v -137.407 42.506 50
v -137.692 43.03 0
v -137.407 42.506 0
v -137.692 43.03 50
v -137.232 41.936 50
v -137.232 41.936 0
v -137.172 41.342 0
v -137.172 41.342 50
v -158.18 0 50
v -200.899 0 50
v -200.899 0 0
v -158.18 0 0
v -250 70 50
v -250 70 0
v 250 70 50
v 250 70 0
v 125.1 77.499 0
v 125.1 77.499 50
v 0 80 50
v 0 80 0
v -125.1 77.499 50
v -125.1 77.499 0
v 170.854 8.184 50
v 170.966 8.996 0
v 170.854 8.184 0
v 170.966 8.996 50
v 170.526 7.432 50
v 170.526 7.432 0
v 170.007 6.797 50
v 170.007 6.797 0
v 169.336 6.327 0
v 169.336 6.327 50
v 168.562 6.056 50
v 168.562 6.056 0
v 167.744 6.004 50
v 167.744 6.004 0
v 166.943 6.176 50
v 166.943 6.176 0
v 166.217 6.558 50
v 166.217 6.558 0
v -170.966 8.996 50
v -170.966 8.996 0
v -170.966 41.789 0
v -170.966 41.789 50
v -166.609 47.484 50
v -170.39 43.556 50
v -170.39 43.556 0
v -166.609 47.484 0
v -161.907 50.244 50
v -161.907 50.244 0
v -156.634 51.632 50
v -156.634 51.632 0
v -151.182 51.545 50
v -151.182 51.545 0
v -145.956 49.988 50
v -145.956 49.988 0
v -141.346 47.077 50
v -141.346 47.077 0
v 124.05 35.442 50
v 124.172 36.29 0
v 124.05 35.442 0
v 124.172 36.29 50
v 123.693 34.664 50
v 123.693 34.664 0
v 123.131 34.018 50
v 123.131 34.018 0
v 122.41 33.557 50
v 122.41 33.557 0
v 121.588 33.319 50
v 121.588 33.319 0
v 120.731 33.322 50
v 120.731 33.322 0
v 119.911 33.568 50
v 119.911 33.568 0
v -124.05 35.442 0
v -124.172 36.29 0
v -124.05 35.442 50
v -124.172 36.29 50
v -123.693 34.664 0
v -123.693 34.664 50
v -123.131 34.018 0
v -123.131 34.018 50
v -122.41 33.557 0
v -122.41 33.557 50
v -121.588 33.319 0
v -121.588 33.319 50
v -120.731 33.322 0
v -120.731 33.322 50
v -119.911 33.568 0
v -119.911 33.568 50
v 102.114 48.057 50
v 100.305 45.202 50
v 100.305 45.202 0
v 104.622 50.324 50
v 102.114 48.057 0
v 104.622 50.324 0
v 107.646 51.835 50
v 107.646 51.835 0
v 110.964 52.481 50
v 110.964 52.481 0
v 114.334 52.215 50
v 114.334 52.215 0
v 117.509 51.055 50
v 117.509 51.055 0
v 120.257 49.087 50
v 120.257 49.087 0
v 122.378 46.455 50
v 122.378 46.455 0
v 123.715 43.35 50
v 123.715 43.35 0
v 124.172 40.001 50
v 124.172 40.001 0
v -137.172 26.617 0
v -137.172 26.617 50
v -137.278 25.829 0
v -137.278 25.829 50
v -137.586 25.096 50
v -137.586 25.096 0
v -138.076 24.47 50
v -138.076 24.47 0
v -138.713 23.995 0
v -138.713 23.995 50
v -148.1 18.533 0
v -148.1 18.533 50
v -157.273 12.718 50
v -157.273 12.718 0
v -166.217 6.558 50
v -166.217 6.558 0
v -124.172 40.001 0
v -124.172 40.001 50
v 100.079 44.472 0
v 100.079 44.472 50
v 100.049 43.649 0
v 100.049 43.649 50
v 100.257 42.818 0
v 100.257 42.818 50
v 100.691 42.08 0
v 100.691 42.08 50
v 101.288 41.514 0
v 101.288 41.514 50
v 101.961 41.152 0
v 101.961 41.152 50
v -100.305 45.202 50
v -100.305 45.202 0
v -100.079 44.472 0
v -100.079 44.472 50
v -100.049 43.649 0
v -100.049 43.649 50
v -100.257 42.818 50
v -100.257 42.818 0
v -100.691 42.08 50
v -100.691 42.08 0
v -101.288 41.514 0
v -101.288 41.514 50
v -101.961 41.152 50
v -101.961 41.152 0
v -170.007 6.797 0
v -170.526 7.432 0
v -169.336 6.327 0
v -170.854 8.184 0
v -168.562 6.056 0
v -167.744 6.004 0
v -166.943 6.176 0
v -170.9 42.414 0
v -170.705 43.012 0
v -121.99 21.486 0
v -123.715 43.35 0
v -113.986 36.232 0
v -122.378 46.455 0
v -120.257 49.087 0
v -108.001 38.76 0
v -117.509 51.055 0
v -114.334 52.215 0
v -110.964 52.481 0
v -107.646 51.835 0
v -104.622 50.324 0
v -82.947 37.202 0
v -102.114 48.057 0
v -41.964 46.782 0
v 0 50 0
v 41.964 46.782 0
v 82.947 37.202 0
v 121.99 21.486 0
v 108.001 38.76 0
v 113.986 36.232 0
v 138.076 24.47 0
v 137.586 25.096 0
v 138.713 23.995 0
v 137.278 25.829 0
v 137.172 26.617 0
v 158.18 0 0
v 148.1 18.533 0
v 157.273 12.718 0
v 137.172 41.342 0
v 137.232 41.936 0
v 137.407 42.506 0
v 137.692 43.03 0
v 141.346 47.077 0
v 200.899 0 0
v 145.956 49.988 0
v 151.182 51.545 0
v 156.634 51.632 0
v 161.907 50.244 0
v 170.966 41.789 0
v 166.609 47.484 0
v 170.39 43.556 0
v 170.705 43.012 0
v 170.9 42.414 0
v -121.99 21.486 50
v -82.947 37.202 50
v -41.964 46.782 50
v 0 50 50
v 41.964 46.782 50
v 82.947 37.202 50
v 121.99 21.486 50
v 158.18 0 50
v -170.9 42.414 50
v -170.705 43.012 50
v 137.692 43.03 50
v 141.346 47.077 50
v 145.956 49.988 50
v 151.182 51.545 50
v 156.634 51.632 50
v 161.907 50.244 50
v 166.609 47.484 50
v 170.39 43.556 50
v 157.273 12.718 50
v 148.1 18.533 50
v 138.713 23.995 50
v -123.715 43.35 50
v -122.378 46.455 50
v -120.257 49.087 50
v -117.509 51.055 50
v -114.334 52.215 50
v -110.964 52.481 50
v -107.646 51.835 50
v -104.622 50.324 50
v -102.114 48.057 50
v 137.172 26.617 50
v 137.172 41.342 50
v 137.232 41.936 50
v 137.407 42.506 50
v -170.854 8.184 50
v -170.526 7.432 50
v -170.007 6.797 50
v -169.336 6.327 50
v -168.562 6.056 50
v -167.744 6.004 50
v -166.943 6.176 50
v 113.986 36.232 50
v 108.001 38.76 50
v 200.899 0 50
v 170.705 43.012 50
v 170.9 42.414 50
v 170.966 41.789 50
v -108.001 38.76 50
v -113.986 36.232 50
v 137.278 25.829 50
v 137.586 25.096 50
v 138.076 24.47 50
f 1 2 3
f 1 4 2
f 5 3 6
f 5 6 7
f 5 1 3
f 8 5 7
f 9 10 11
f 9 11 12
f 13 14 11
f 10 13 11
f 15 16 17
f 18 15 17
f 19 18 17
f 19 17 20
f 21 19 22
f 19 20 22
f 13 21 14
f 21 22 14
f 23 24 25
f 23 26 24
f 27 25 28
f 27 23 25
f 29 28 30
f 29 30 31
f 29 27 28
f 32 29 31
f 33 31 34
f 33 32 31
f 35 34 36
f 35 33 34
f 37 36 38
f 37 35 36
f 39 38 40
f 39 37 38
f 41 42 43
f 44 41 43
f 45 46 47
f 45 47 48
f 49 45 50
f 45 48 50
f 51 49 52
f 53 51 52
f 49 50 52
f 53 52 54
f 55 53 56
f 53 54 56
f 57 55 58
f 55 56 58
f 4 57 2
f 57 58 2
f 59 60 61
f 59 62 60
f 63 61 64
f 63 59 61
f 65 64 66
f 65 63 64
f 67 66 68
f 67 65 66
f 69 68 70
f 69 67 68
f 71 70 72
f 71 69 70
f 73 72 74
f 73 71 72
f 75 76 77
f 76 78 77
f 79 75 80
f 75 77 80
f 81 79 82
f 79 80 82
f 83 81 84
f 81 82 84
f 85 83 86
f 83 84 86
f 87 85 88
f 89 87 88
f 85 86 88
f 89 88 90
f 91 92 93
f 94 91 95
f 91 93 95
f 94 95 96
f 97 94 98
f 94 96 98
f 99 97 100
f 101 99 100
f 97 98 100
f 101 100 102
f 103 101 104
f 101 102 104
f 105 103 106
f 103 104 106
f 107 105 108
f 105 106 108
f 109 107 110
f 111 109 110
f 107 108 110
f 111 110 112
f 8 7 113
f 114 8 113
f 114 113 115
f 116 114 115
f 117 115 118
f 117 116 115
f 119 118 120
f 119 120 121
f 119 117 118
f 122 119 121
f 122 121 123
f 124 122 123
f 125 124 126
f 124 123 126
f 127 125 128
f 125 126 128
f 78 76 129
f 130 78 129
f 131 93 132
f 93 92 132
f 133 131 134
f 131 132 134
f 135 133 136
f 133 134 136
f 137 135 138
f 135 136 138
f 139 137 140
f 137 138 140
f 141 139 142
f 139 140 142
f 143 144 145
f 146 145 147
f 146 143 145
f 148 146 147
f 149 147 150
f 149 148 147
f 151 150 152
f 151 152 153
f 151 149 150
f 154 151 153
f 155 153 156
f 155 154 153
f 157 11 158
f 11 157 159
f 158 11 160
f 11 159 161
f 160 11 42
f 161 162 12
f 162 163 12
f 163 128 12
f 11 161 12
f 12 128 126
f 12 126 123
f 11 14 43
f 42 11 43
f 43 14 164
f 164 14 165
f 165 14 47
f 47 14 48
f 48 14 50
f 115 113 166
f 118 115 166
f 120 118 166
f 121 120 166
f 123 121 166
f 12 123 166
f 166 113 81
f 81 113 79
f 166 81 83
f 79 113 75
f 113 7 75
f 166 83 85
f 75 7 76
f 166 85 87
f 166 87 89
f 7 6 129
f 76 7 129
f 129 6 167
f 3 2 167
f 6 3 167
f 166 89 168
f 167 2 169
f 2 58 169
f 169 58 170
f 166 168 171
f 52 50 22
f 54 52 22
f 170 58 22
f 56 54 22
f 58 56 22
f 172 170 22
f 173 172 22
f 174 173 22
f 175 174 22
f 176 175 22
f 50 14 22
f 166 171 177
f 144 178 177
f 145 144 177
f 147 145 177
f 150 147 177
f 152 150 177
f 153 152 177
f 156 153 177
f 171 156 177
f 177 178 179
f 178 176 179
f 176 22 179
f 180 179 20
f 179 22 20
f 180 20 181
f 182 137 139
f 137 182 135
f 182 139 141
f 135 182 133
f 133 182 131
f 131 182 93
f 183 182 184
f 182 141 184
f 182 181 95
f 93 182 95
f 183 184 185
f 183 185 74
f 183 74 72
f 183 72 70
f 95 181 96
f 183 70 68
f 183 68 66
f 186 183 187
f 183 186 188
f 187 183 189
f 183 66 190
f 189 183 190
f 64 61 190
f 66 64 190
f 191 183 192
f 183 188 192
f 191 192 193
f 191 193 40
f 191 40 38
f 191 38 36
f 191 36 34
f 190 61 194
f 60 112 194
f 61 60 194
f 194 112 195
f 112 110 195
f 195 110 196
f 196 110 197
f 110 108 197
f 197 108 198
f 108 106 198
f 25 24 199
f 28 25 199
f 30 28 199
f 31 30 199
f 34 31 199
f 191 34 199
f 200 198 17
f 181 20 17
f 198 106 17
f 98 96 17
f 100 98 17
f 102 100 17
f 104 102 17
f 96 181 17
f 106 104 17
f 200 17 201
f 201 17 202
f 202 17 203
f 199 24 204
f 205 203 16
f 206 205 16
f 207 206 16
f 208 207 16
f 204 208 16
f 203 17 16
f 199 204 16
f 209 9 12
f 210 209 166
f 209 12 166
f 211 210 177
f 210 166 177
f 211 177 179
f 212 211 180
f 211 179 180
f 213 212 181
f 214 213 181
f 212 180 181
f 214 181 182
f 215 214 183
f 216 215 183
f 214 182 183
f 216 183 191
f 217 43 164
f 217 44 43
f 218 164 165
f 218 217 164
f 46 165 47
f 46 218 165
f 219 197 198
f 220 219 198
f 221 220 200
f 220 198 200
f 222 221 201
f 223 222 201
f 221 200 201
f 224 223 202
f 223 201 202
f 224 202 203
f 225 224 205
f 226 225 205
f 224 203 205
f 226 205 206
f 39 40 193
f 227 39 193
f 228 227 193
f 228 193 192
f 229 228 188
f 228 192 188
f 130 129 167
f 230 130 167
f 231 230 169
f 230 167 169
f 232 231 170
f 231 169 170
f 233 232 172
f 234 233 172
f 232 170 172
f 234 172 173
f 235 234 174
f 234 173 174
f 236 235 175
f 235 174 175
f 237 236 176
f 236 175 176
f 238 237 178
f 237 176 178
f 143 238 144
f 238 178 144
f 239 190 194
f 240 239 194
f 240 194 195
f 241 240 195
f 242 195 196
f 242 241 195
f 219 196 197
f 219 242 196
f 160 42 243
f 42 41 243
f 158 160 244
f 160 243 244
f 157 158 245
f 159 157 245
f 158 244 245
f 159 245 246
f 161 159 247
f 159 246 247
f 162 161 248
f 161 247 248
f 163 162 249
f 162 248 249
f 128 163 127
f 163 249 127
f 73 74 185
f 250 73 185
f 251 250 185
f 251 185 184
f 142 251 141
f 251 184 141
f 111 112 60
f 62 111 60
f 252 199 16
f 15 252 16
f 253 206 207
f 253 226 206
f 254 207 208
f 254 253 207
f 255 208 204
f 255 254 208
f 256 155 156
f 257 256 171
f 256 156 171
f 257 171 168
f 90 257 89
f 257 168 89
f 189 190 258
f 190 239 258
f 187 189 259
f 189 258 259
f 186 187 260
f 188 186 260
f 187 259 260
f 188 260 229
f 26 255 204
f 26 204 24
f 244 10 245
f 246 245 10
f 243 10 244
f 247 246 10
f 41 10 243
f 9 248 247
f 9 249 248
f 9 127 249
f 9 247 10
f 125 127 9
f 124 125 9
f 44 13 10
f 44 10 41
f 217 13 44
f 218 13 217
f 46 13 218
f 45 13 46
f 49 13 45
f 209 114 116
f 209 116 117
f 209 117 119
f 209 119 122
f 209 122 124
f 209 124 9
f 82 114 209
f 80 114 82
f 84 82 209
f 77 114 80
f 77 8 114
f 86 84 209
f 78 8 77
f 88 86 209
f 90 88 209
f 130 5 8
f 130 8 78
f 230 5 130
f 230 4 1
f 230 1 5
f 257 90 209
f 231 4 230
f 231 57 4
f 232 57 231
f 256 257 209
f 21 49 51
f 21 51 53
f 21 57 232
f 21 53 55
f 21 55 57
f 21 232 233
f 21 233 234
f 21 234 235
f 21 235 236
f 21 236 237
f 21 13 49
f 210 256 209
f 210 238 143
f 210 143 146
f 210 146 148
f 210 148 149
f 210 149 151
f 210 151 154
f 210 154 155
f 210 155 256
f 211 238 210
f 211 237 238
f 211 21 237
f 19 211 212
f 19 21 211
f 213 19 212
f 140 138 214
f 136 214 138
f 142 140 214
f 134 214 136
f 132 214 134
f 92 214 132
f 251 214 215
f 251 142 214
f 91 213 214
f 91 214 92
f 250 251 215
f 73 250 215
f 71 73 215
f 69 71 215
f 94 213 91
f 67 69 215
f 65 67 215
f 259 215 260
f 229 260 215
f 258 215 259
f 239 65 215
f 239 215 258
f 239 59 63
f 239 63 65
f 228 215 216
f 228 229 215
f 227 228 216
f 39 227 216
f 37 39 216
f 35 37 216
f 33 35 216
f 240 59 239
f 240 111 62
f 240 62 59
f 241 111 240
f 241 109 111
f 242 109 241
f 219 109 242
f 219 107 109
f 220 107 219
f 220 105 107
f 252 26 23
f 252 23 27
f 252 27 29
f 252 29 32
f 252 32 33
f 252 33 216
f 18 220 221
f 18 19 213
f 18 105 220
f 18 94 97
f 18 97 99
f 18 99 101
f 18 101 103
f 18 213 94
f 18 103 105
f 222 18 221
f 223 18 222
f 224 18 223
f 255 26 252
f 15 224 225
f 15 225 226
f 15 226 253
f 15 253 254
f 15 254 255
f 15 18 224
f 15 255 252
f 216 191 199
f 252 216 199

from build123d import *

# Parameters (mm, degrees)
EXTRUDE_1_DEPTH = 50
FILLET_1_R      = 3


with BuildPart() as part:
    # 草图2 → 凸台-拉伸1 (new body)
    with BuildSketch(Plane.XY):
        with BuildLine():
            Line((-200.898692044, 0), (-175, 0))
            ThreePointArc((-175, 0), (-172.9897341, 1.547802854), (-170.96577925, 3.077662138))
            Line((-170.96577925, 3.077662138), (-170.96577925, 42.722835601))
            ThreePointArc((-170.96577925, 42.722835601), (-153.932084993, 51.775484786), (-137.172282431, 42.225290265))
            Line((-137.172282431, 42.225290265), (-137.172282431, 24.846777263))
            ThreePointArc((-137.172282431, 24.846777263), (-130.71526297, 28.281929654), (-124.172282431, 31.55038157))
            Line((-124.172282431, 31.55038157), (-124.172282431, 40.001262339))
            ThreePointArc((-124.172282431, 40.001262339), (-112.742884956, 52.455330358), (-99.355672794, 42.134599408))
            ThreePointArc((-99.355672794, 42.134599408), (0, 60), (99.355672794, 42.134599408))
            ThreePointArc((99.355672794, 42.134599408), (112.742884956, 52.455330358), (124.172282431, 40.001262339))
            Line((124.172282431, 40.001262339), (124.172282431, 31.55038157))
            ThreePointArc((124.172282431, 31.55038157), (130.71526297, 28.281929654), (137.172282431, 24.846777263))
            Line((137.172282431, 24.846777263), (137.172282431, 42.225290265))
            ThreePointArc((137.172282431, 42.225290265), (153.932084993, 51.775484786), (170.96577925, 42.722835601))
            Line((170.96577925, 42.722835601), (170.96577925, 3.077662138))
            ThreePointArc((170.96577925, 3.077662138), (172.9897341, 1.547802854), (175, 0))
            Line((175, 0), (200.898692044, 0))
            Line((200.898692044, 0), (250, 70))
            ThreePointArc((250, 70), (0, 80), (-250, 70))
            Line((-250, 70), (-200.898692044, 0))
        make_face()
        with BuildLine():
            Line((-175, 0), (-158.179750074, 0))
            ThreePointArc((-158.179750074, 0), (0, 50), (158.179750074, 0))
            Line((158.179750074, 0), (175, 0))
            ThreePointArc((175, 0), (0, 60), (-175, 0))
        make_face()
    extrude(amount=EXTRUDE_1_DEPTH)

    # 圆角1
    fillet_1_edges = [part.edges().sort_by_distance(p)[0] for p in [
        (137.172282431, 24.846777263, 25),
        (170.96577925, 3.077662138, 25),
        (170.96577925, 42.722835601, 25),
        (137.172282431, 42.225290265, 25),
        (124.172282431, 31.55038157, 25),
        (99.355672794, 42.134599408, 25),
        (-99.355672794, 42.134599408, 25),
        (-124.172282431, 31.55038157, 25),
        (-137.172282431, 24.846777263, 25),
        (-137.172282431, 42.225290265, 25),
        (-170.96577925, 42.722835601, 25),
        (-170.96577925, 3.077662138, 25),
    ]]
    fillet(fillet_1_edges, radius=FILLET_1_R)


solid = part.part
